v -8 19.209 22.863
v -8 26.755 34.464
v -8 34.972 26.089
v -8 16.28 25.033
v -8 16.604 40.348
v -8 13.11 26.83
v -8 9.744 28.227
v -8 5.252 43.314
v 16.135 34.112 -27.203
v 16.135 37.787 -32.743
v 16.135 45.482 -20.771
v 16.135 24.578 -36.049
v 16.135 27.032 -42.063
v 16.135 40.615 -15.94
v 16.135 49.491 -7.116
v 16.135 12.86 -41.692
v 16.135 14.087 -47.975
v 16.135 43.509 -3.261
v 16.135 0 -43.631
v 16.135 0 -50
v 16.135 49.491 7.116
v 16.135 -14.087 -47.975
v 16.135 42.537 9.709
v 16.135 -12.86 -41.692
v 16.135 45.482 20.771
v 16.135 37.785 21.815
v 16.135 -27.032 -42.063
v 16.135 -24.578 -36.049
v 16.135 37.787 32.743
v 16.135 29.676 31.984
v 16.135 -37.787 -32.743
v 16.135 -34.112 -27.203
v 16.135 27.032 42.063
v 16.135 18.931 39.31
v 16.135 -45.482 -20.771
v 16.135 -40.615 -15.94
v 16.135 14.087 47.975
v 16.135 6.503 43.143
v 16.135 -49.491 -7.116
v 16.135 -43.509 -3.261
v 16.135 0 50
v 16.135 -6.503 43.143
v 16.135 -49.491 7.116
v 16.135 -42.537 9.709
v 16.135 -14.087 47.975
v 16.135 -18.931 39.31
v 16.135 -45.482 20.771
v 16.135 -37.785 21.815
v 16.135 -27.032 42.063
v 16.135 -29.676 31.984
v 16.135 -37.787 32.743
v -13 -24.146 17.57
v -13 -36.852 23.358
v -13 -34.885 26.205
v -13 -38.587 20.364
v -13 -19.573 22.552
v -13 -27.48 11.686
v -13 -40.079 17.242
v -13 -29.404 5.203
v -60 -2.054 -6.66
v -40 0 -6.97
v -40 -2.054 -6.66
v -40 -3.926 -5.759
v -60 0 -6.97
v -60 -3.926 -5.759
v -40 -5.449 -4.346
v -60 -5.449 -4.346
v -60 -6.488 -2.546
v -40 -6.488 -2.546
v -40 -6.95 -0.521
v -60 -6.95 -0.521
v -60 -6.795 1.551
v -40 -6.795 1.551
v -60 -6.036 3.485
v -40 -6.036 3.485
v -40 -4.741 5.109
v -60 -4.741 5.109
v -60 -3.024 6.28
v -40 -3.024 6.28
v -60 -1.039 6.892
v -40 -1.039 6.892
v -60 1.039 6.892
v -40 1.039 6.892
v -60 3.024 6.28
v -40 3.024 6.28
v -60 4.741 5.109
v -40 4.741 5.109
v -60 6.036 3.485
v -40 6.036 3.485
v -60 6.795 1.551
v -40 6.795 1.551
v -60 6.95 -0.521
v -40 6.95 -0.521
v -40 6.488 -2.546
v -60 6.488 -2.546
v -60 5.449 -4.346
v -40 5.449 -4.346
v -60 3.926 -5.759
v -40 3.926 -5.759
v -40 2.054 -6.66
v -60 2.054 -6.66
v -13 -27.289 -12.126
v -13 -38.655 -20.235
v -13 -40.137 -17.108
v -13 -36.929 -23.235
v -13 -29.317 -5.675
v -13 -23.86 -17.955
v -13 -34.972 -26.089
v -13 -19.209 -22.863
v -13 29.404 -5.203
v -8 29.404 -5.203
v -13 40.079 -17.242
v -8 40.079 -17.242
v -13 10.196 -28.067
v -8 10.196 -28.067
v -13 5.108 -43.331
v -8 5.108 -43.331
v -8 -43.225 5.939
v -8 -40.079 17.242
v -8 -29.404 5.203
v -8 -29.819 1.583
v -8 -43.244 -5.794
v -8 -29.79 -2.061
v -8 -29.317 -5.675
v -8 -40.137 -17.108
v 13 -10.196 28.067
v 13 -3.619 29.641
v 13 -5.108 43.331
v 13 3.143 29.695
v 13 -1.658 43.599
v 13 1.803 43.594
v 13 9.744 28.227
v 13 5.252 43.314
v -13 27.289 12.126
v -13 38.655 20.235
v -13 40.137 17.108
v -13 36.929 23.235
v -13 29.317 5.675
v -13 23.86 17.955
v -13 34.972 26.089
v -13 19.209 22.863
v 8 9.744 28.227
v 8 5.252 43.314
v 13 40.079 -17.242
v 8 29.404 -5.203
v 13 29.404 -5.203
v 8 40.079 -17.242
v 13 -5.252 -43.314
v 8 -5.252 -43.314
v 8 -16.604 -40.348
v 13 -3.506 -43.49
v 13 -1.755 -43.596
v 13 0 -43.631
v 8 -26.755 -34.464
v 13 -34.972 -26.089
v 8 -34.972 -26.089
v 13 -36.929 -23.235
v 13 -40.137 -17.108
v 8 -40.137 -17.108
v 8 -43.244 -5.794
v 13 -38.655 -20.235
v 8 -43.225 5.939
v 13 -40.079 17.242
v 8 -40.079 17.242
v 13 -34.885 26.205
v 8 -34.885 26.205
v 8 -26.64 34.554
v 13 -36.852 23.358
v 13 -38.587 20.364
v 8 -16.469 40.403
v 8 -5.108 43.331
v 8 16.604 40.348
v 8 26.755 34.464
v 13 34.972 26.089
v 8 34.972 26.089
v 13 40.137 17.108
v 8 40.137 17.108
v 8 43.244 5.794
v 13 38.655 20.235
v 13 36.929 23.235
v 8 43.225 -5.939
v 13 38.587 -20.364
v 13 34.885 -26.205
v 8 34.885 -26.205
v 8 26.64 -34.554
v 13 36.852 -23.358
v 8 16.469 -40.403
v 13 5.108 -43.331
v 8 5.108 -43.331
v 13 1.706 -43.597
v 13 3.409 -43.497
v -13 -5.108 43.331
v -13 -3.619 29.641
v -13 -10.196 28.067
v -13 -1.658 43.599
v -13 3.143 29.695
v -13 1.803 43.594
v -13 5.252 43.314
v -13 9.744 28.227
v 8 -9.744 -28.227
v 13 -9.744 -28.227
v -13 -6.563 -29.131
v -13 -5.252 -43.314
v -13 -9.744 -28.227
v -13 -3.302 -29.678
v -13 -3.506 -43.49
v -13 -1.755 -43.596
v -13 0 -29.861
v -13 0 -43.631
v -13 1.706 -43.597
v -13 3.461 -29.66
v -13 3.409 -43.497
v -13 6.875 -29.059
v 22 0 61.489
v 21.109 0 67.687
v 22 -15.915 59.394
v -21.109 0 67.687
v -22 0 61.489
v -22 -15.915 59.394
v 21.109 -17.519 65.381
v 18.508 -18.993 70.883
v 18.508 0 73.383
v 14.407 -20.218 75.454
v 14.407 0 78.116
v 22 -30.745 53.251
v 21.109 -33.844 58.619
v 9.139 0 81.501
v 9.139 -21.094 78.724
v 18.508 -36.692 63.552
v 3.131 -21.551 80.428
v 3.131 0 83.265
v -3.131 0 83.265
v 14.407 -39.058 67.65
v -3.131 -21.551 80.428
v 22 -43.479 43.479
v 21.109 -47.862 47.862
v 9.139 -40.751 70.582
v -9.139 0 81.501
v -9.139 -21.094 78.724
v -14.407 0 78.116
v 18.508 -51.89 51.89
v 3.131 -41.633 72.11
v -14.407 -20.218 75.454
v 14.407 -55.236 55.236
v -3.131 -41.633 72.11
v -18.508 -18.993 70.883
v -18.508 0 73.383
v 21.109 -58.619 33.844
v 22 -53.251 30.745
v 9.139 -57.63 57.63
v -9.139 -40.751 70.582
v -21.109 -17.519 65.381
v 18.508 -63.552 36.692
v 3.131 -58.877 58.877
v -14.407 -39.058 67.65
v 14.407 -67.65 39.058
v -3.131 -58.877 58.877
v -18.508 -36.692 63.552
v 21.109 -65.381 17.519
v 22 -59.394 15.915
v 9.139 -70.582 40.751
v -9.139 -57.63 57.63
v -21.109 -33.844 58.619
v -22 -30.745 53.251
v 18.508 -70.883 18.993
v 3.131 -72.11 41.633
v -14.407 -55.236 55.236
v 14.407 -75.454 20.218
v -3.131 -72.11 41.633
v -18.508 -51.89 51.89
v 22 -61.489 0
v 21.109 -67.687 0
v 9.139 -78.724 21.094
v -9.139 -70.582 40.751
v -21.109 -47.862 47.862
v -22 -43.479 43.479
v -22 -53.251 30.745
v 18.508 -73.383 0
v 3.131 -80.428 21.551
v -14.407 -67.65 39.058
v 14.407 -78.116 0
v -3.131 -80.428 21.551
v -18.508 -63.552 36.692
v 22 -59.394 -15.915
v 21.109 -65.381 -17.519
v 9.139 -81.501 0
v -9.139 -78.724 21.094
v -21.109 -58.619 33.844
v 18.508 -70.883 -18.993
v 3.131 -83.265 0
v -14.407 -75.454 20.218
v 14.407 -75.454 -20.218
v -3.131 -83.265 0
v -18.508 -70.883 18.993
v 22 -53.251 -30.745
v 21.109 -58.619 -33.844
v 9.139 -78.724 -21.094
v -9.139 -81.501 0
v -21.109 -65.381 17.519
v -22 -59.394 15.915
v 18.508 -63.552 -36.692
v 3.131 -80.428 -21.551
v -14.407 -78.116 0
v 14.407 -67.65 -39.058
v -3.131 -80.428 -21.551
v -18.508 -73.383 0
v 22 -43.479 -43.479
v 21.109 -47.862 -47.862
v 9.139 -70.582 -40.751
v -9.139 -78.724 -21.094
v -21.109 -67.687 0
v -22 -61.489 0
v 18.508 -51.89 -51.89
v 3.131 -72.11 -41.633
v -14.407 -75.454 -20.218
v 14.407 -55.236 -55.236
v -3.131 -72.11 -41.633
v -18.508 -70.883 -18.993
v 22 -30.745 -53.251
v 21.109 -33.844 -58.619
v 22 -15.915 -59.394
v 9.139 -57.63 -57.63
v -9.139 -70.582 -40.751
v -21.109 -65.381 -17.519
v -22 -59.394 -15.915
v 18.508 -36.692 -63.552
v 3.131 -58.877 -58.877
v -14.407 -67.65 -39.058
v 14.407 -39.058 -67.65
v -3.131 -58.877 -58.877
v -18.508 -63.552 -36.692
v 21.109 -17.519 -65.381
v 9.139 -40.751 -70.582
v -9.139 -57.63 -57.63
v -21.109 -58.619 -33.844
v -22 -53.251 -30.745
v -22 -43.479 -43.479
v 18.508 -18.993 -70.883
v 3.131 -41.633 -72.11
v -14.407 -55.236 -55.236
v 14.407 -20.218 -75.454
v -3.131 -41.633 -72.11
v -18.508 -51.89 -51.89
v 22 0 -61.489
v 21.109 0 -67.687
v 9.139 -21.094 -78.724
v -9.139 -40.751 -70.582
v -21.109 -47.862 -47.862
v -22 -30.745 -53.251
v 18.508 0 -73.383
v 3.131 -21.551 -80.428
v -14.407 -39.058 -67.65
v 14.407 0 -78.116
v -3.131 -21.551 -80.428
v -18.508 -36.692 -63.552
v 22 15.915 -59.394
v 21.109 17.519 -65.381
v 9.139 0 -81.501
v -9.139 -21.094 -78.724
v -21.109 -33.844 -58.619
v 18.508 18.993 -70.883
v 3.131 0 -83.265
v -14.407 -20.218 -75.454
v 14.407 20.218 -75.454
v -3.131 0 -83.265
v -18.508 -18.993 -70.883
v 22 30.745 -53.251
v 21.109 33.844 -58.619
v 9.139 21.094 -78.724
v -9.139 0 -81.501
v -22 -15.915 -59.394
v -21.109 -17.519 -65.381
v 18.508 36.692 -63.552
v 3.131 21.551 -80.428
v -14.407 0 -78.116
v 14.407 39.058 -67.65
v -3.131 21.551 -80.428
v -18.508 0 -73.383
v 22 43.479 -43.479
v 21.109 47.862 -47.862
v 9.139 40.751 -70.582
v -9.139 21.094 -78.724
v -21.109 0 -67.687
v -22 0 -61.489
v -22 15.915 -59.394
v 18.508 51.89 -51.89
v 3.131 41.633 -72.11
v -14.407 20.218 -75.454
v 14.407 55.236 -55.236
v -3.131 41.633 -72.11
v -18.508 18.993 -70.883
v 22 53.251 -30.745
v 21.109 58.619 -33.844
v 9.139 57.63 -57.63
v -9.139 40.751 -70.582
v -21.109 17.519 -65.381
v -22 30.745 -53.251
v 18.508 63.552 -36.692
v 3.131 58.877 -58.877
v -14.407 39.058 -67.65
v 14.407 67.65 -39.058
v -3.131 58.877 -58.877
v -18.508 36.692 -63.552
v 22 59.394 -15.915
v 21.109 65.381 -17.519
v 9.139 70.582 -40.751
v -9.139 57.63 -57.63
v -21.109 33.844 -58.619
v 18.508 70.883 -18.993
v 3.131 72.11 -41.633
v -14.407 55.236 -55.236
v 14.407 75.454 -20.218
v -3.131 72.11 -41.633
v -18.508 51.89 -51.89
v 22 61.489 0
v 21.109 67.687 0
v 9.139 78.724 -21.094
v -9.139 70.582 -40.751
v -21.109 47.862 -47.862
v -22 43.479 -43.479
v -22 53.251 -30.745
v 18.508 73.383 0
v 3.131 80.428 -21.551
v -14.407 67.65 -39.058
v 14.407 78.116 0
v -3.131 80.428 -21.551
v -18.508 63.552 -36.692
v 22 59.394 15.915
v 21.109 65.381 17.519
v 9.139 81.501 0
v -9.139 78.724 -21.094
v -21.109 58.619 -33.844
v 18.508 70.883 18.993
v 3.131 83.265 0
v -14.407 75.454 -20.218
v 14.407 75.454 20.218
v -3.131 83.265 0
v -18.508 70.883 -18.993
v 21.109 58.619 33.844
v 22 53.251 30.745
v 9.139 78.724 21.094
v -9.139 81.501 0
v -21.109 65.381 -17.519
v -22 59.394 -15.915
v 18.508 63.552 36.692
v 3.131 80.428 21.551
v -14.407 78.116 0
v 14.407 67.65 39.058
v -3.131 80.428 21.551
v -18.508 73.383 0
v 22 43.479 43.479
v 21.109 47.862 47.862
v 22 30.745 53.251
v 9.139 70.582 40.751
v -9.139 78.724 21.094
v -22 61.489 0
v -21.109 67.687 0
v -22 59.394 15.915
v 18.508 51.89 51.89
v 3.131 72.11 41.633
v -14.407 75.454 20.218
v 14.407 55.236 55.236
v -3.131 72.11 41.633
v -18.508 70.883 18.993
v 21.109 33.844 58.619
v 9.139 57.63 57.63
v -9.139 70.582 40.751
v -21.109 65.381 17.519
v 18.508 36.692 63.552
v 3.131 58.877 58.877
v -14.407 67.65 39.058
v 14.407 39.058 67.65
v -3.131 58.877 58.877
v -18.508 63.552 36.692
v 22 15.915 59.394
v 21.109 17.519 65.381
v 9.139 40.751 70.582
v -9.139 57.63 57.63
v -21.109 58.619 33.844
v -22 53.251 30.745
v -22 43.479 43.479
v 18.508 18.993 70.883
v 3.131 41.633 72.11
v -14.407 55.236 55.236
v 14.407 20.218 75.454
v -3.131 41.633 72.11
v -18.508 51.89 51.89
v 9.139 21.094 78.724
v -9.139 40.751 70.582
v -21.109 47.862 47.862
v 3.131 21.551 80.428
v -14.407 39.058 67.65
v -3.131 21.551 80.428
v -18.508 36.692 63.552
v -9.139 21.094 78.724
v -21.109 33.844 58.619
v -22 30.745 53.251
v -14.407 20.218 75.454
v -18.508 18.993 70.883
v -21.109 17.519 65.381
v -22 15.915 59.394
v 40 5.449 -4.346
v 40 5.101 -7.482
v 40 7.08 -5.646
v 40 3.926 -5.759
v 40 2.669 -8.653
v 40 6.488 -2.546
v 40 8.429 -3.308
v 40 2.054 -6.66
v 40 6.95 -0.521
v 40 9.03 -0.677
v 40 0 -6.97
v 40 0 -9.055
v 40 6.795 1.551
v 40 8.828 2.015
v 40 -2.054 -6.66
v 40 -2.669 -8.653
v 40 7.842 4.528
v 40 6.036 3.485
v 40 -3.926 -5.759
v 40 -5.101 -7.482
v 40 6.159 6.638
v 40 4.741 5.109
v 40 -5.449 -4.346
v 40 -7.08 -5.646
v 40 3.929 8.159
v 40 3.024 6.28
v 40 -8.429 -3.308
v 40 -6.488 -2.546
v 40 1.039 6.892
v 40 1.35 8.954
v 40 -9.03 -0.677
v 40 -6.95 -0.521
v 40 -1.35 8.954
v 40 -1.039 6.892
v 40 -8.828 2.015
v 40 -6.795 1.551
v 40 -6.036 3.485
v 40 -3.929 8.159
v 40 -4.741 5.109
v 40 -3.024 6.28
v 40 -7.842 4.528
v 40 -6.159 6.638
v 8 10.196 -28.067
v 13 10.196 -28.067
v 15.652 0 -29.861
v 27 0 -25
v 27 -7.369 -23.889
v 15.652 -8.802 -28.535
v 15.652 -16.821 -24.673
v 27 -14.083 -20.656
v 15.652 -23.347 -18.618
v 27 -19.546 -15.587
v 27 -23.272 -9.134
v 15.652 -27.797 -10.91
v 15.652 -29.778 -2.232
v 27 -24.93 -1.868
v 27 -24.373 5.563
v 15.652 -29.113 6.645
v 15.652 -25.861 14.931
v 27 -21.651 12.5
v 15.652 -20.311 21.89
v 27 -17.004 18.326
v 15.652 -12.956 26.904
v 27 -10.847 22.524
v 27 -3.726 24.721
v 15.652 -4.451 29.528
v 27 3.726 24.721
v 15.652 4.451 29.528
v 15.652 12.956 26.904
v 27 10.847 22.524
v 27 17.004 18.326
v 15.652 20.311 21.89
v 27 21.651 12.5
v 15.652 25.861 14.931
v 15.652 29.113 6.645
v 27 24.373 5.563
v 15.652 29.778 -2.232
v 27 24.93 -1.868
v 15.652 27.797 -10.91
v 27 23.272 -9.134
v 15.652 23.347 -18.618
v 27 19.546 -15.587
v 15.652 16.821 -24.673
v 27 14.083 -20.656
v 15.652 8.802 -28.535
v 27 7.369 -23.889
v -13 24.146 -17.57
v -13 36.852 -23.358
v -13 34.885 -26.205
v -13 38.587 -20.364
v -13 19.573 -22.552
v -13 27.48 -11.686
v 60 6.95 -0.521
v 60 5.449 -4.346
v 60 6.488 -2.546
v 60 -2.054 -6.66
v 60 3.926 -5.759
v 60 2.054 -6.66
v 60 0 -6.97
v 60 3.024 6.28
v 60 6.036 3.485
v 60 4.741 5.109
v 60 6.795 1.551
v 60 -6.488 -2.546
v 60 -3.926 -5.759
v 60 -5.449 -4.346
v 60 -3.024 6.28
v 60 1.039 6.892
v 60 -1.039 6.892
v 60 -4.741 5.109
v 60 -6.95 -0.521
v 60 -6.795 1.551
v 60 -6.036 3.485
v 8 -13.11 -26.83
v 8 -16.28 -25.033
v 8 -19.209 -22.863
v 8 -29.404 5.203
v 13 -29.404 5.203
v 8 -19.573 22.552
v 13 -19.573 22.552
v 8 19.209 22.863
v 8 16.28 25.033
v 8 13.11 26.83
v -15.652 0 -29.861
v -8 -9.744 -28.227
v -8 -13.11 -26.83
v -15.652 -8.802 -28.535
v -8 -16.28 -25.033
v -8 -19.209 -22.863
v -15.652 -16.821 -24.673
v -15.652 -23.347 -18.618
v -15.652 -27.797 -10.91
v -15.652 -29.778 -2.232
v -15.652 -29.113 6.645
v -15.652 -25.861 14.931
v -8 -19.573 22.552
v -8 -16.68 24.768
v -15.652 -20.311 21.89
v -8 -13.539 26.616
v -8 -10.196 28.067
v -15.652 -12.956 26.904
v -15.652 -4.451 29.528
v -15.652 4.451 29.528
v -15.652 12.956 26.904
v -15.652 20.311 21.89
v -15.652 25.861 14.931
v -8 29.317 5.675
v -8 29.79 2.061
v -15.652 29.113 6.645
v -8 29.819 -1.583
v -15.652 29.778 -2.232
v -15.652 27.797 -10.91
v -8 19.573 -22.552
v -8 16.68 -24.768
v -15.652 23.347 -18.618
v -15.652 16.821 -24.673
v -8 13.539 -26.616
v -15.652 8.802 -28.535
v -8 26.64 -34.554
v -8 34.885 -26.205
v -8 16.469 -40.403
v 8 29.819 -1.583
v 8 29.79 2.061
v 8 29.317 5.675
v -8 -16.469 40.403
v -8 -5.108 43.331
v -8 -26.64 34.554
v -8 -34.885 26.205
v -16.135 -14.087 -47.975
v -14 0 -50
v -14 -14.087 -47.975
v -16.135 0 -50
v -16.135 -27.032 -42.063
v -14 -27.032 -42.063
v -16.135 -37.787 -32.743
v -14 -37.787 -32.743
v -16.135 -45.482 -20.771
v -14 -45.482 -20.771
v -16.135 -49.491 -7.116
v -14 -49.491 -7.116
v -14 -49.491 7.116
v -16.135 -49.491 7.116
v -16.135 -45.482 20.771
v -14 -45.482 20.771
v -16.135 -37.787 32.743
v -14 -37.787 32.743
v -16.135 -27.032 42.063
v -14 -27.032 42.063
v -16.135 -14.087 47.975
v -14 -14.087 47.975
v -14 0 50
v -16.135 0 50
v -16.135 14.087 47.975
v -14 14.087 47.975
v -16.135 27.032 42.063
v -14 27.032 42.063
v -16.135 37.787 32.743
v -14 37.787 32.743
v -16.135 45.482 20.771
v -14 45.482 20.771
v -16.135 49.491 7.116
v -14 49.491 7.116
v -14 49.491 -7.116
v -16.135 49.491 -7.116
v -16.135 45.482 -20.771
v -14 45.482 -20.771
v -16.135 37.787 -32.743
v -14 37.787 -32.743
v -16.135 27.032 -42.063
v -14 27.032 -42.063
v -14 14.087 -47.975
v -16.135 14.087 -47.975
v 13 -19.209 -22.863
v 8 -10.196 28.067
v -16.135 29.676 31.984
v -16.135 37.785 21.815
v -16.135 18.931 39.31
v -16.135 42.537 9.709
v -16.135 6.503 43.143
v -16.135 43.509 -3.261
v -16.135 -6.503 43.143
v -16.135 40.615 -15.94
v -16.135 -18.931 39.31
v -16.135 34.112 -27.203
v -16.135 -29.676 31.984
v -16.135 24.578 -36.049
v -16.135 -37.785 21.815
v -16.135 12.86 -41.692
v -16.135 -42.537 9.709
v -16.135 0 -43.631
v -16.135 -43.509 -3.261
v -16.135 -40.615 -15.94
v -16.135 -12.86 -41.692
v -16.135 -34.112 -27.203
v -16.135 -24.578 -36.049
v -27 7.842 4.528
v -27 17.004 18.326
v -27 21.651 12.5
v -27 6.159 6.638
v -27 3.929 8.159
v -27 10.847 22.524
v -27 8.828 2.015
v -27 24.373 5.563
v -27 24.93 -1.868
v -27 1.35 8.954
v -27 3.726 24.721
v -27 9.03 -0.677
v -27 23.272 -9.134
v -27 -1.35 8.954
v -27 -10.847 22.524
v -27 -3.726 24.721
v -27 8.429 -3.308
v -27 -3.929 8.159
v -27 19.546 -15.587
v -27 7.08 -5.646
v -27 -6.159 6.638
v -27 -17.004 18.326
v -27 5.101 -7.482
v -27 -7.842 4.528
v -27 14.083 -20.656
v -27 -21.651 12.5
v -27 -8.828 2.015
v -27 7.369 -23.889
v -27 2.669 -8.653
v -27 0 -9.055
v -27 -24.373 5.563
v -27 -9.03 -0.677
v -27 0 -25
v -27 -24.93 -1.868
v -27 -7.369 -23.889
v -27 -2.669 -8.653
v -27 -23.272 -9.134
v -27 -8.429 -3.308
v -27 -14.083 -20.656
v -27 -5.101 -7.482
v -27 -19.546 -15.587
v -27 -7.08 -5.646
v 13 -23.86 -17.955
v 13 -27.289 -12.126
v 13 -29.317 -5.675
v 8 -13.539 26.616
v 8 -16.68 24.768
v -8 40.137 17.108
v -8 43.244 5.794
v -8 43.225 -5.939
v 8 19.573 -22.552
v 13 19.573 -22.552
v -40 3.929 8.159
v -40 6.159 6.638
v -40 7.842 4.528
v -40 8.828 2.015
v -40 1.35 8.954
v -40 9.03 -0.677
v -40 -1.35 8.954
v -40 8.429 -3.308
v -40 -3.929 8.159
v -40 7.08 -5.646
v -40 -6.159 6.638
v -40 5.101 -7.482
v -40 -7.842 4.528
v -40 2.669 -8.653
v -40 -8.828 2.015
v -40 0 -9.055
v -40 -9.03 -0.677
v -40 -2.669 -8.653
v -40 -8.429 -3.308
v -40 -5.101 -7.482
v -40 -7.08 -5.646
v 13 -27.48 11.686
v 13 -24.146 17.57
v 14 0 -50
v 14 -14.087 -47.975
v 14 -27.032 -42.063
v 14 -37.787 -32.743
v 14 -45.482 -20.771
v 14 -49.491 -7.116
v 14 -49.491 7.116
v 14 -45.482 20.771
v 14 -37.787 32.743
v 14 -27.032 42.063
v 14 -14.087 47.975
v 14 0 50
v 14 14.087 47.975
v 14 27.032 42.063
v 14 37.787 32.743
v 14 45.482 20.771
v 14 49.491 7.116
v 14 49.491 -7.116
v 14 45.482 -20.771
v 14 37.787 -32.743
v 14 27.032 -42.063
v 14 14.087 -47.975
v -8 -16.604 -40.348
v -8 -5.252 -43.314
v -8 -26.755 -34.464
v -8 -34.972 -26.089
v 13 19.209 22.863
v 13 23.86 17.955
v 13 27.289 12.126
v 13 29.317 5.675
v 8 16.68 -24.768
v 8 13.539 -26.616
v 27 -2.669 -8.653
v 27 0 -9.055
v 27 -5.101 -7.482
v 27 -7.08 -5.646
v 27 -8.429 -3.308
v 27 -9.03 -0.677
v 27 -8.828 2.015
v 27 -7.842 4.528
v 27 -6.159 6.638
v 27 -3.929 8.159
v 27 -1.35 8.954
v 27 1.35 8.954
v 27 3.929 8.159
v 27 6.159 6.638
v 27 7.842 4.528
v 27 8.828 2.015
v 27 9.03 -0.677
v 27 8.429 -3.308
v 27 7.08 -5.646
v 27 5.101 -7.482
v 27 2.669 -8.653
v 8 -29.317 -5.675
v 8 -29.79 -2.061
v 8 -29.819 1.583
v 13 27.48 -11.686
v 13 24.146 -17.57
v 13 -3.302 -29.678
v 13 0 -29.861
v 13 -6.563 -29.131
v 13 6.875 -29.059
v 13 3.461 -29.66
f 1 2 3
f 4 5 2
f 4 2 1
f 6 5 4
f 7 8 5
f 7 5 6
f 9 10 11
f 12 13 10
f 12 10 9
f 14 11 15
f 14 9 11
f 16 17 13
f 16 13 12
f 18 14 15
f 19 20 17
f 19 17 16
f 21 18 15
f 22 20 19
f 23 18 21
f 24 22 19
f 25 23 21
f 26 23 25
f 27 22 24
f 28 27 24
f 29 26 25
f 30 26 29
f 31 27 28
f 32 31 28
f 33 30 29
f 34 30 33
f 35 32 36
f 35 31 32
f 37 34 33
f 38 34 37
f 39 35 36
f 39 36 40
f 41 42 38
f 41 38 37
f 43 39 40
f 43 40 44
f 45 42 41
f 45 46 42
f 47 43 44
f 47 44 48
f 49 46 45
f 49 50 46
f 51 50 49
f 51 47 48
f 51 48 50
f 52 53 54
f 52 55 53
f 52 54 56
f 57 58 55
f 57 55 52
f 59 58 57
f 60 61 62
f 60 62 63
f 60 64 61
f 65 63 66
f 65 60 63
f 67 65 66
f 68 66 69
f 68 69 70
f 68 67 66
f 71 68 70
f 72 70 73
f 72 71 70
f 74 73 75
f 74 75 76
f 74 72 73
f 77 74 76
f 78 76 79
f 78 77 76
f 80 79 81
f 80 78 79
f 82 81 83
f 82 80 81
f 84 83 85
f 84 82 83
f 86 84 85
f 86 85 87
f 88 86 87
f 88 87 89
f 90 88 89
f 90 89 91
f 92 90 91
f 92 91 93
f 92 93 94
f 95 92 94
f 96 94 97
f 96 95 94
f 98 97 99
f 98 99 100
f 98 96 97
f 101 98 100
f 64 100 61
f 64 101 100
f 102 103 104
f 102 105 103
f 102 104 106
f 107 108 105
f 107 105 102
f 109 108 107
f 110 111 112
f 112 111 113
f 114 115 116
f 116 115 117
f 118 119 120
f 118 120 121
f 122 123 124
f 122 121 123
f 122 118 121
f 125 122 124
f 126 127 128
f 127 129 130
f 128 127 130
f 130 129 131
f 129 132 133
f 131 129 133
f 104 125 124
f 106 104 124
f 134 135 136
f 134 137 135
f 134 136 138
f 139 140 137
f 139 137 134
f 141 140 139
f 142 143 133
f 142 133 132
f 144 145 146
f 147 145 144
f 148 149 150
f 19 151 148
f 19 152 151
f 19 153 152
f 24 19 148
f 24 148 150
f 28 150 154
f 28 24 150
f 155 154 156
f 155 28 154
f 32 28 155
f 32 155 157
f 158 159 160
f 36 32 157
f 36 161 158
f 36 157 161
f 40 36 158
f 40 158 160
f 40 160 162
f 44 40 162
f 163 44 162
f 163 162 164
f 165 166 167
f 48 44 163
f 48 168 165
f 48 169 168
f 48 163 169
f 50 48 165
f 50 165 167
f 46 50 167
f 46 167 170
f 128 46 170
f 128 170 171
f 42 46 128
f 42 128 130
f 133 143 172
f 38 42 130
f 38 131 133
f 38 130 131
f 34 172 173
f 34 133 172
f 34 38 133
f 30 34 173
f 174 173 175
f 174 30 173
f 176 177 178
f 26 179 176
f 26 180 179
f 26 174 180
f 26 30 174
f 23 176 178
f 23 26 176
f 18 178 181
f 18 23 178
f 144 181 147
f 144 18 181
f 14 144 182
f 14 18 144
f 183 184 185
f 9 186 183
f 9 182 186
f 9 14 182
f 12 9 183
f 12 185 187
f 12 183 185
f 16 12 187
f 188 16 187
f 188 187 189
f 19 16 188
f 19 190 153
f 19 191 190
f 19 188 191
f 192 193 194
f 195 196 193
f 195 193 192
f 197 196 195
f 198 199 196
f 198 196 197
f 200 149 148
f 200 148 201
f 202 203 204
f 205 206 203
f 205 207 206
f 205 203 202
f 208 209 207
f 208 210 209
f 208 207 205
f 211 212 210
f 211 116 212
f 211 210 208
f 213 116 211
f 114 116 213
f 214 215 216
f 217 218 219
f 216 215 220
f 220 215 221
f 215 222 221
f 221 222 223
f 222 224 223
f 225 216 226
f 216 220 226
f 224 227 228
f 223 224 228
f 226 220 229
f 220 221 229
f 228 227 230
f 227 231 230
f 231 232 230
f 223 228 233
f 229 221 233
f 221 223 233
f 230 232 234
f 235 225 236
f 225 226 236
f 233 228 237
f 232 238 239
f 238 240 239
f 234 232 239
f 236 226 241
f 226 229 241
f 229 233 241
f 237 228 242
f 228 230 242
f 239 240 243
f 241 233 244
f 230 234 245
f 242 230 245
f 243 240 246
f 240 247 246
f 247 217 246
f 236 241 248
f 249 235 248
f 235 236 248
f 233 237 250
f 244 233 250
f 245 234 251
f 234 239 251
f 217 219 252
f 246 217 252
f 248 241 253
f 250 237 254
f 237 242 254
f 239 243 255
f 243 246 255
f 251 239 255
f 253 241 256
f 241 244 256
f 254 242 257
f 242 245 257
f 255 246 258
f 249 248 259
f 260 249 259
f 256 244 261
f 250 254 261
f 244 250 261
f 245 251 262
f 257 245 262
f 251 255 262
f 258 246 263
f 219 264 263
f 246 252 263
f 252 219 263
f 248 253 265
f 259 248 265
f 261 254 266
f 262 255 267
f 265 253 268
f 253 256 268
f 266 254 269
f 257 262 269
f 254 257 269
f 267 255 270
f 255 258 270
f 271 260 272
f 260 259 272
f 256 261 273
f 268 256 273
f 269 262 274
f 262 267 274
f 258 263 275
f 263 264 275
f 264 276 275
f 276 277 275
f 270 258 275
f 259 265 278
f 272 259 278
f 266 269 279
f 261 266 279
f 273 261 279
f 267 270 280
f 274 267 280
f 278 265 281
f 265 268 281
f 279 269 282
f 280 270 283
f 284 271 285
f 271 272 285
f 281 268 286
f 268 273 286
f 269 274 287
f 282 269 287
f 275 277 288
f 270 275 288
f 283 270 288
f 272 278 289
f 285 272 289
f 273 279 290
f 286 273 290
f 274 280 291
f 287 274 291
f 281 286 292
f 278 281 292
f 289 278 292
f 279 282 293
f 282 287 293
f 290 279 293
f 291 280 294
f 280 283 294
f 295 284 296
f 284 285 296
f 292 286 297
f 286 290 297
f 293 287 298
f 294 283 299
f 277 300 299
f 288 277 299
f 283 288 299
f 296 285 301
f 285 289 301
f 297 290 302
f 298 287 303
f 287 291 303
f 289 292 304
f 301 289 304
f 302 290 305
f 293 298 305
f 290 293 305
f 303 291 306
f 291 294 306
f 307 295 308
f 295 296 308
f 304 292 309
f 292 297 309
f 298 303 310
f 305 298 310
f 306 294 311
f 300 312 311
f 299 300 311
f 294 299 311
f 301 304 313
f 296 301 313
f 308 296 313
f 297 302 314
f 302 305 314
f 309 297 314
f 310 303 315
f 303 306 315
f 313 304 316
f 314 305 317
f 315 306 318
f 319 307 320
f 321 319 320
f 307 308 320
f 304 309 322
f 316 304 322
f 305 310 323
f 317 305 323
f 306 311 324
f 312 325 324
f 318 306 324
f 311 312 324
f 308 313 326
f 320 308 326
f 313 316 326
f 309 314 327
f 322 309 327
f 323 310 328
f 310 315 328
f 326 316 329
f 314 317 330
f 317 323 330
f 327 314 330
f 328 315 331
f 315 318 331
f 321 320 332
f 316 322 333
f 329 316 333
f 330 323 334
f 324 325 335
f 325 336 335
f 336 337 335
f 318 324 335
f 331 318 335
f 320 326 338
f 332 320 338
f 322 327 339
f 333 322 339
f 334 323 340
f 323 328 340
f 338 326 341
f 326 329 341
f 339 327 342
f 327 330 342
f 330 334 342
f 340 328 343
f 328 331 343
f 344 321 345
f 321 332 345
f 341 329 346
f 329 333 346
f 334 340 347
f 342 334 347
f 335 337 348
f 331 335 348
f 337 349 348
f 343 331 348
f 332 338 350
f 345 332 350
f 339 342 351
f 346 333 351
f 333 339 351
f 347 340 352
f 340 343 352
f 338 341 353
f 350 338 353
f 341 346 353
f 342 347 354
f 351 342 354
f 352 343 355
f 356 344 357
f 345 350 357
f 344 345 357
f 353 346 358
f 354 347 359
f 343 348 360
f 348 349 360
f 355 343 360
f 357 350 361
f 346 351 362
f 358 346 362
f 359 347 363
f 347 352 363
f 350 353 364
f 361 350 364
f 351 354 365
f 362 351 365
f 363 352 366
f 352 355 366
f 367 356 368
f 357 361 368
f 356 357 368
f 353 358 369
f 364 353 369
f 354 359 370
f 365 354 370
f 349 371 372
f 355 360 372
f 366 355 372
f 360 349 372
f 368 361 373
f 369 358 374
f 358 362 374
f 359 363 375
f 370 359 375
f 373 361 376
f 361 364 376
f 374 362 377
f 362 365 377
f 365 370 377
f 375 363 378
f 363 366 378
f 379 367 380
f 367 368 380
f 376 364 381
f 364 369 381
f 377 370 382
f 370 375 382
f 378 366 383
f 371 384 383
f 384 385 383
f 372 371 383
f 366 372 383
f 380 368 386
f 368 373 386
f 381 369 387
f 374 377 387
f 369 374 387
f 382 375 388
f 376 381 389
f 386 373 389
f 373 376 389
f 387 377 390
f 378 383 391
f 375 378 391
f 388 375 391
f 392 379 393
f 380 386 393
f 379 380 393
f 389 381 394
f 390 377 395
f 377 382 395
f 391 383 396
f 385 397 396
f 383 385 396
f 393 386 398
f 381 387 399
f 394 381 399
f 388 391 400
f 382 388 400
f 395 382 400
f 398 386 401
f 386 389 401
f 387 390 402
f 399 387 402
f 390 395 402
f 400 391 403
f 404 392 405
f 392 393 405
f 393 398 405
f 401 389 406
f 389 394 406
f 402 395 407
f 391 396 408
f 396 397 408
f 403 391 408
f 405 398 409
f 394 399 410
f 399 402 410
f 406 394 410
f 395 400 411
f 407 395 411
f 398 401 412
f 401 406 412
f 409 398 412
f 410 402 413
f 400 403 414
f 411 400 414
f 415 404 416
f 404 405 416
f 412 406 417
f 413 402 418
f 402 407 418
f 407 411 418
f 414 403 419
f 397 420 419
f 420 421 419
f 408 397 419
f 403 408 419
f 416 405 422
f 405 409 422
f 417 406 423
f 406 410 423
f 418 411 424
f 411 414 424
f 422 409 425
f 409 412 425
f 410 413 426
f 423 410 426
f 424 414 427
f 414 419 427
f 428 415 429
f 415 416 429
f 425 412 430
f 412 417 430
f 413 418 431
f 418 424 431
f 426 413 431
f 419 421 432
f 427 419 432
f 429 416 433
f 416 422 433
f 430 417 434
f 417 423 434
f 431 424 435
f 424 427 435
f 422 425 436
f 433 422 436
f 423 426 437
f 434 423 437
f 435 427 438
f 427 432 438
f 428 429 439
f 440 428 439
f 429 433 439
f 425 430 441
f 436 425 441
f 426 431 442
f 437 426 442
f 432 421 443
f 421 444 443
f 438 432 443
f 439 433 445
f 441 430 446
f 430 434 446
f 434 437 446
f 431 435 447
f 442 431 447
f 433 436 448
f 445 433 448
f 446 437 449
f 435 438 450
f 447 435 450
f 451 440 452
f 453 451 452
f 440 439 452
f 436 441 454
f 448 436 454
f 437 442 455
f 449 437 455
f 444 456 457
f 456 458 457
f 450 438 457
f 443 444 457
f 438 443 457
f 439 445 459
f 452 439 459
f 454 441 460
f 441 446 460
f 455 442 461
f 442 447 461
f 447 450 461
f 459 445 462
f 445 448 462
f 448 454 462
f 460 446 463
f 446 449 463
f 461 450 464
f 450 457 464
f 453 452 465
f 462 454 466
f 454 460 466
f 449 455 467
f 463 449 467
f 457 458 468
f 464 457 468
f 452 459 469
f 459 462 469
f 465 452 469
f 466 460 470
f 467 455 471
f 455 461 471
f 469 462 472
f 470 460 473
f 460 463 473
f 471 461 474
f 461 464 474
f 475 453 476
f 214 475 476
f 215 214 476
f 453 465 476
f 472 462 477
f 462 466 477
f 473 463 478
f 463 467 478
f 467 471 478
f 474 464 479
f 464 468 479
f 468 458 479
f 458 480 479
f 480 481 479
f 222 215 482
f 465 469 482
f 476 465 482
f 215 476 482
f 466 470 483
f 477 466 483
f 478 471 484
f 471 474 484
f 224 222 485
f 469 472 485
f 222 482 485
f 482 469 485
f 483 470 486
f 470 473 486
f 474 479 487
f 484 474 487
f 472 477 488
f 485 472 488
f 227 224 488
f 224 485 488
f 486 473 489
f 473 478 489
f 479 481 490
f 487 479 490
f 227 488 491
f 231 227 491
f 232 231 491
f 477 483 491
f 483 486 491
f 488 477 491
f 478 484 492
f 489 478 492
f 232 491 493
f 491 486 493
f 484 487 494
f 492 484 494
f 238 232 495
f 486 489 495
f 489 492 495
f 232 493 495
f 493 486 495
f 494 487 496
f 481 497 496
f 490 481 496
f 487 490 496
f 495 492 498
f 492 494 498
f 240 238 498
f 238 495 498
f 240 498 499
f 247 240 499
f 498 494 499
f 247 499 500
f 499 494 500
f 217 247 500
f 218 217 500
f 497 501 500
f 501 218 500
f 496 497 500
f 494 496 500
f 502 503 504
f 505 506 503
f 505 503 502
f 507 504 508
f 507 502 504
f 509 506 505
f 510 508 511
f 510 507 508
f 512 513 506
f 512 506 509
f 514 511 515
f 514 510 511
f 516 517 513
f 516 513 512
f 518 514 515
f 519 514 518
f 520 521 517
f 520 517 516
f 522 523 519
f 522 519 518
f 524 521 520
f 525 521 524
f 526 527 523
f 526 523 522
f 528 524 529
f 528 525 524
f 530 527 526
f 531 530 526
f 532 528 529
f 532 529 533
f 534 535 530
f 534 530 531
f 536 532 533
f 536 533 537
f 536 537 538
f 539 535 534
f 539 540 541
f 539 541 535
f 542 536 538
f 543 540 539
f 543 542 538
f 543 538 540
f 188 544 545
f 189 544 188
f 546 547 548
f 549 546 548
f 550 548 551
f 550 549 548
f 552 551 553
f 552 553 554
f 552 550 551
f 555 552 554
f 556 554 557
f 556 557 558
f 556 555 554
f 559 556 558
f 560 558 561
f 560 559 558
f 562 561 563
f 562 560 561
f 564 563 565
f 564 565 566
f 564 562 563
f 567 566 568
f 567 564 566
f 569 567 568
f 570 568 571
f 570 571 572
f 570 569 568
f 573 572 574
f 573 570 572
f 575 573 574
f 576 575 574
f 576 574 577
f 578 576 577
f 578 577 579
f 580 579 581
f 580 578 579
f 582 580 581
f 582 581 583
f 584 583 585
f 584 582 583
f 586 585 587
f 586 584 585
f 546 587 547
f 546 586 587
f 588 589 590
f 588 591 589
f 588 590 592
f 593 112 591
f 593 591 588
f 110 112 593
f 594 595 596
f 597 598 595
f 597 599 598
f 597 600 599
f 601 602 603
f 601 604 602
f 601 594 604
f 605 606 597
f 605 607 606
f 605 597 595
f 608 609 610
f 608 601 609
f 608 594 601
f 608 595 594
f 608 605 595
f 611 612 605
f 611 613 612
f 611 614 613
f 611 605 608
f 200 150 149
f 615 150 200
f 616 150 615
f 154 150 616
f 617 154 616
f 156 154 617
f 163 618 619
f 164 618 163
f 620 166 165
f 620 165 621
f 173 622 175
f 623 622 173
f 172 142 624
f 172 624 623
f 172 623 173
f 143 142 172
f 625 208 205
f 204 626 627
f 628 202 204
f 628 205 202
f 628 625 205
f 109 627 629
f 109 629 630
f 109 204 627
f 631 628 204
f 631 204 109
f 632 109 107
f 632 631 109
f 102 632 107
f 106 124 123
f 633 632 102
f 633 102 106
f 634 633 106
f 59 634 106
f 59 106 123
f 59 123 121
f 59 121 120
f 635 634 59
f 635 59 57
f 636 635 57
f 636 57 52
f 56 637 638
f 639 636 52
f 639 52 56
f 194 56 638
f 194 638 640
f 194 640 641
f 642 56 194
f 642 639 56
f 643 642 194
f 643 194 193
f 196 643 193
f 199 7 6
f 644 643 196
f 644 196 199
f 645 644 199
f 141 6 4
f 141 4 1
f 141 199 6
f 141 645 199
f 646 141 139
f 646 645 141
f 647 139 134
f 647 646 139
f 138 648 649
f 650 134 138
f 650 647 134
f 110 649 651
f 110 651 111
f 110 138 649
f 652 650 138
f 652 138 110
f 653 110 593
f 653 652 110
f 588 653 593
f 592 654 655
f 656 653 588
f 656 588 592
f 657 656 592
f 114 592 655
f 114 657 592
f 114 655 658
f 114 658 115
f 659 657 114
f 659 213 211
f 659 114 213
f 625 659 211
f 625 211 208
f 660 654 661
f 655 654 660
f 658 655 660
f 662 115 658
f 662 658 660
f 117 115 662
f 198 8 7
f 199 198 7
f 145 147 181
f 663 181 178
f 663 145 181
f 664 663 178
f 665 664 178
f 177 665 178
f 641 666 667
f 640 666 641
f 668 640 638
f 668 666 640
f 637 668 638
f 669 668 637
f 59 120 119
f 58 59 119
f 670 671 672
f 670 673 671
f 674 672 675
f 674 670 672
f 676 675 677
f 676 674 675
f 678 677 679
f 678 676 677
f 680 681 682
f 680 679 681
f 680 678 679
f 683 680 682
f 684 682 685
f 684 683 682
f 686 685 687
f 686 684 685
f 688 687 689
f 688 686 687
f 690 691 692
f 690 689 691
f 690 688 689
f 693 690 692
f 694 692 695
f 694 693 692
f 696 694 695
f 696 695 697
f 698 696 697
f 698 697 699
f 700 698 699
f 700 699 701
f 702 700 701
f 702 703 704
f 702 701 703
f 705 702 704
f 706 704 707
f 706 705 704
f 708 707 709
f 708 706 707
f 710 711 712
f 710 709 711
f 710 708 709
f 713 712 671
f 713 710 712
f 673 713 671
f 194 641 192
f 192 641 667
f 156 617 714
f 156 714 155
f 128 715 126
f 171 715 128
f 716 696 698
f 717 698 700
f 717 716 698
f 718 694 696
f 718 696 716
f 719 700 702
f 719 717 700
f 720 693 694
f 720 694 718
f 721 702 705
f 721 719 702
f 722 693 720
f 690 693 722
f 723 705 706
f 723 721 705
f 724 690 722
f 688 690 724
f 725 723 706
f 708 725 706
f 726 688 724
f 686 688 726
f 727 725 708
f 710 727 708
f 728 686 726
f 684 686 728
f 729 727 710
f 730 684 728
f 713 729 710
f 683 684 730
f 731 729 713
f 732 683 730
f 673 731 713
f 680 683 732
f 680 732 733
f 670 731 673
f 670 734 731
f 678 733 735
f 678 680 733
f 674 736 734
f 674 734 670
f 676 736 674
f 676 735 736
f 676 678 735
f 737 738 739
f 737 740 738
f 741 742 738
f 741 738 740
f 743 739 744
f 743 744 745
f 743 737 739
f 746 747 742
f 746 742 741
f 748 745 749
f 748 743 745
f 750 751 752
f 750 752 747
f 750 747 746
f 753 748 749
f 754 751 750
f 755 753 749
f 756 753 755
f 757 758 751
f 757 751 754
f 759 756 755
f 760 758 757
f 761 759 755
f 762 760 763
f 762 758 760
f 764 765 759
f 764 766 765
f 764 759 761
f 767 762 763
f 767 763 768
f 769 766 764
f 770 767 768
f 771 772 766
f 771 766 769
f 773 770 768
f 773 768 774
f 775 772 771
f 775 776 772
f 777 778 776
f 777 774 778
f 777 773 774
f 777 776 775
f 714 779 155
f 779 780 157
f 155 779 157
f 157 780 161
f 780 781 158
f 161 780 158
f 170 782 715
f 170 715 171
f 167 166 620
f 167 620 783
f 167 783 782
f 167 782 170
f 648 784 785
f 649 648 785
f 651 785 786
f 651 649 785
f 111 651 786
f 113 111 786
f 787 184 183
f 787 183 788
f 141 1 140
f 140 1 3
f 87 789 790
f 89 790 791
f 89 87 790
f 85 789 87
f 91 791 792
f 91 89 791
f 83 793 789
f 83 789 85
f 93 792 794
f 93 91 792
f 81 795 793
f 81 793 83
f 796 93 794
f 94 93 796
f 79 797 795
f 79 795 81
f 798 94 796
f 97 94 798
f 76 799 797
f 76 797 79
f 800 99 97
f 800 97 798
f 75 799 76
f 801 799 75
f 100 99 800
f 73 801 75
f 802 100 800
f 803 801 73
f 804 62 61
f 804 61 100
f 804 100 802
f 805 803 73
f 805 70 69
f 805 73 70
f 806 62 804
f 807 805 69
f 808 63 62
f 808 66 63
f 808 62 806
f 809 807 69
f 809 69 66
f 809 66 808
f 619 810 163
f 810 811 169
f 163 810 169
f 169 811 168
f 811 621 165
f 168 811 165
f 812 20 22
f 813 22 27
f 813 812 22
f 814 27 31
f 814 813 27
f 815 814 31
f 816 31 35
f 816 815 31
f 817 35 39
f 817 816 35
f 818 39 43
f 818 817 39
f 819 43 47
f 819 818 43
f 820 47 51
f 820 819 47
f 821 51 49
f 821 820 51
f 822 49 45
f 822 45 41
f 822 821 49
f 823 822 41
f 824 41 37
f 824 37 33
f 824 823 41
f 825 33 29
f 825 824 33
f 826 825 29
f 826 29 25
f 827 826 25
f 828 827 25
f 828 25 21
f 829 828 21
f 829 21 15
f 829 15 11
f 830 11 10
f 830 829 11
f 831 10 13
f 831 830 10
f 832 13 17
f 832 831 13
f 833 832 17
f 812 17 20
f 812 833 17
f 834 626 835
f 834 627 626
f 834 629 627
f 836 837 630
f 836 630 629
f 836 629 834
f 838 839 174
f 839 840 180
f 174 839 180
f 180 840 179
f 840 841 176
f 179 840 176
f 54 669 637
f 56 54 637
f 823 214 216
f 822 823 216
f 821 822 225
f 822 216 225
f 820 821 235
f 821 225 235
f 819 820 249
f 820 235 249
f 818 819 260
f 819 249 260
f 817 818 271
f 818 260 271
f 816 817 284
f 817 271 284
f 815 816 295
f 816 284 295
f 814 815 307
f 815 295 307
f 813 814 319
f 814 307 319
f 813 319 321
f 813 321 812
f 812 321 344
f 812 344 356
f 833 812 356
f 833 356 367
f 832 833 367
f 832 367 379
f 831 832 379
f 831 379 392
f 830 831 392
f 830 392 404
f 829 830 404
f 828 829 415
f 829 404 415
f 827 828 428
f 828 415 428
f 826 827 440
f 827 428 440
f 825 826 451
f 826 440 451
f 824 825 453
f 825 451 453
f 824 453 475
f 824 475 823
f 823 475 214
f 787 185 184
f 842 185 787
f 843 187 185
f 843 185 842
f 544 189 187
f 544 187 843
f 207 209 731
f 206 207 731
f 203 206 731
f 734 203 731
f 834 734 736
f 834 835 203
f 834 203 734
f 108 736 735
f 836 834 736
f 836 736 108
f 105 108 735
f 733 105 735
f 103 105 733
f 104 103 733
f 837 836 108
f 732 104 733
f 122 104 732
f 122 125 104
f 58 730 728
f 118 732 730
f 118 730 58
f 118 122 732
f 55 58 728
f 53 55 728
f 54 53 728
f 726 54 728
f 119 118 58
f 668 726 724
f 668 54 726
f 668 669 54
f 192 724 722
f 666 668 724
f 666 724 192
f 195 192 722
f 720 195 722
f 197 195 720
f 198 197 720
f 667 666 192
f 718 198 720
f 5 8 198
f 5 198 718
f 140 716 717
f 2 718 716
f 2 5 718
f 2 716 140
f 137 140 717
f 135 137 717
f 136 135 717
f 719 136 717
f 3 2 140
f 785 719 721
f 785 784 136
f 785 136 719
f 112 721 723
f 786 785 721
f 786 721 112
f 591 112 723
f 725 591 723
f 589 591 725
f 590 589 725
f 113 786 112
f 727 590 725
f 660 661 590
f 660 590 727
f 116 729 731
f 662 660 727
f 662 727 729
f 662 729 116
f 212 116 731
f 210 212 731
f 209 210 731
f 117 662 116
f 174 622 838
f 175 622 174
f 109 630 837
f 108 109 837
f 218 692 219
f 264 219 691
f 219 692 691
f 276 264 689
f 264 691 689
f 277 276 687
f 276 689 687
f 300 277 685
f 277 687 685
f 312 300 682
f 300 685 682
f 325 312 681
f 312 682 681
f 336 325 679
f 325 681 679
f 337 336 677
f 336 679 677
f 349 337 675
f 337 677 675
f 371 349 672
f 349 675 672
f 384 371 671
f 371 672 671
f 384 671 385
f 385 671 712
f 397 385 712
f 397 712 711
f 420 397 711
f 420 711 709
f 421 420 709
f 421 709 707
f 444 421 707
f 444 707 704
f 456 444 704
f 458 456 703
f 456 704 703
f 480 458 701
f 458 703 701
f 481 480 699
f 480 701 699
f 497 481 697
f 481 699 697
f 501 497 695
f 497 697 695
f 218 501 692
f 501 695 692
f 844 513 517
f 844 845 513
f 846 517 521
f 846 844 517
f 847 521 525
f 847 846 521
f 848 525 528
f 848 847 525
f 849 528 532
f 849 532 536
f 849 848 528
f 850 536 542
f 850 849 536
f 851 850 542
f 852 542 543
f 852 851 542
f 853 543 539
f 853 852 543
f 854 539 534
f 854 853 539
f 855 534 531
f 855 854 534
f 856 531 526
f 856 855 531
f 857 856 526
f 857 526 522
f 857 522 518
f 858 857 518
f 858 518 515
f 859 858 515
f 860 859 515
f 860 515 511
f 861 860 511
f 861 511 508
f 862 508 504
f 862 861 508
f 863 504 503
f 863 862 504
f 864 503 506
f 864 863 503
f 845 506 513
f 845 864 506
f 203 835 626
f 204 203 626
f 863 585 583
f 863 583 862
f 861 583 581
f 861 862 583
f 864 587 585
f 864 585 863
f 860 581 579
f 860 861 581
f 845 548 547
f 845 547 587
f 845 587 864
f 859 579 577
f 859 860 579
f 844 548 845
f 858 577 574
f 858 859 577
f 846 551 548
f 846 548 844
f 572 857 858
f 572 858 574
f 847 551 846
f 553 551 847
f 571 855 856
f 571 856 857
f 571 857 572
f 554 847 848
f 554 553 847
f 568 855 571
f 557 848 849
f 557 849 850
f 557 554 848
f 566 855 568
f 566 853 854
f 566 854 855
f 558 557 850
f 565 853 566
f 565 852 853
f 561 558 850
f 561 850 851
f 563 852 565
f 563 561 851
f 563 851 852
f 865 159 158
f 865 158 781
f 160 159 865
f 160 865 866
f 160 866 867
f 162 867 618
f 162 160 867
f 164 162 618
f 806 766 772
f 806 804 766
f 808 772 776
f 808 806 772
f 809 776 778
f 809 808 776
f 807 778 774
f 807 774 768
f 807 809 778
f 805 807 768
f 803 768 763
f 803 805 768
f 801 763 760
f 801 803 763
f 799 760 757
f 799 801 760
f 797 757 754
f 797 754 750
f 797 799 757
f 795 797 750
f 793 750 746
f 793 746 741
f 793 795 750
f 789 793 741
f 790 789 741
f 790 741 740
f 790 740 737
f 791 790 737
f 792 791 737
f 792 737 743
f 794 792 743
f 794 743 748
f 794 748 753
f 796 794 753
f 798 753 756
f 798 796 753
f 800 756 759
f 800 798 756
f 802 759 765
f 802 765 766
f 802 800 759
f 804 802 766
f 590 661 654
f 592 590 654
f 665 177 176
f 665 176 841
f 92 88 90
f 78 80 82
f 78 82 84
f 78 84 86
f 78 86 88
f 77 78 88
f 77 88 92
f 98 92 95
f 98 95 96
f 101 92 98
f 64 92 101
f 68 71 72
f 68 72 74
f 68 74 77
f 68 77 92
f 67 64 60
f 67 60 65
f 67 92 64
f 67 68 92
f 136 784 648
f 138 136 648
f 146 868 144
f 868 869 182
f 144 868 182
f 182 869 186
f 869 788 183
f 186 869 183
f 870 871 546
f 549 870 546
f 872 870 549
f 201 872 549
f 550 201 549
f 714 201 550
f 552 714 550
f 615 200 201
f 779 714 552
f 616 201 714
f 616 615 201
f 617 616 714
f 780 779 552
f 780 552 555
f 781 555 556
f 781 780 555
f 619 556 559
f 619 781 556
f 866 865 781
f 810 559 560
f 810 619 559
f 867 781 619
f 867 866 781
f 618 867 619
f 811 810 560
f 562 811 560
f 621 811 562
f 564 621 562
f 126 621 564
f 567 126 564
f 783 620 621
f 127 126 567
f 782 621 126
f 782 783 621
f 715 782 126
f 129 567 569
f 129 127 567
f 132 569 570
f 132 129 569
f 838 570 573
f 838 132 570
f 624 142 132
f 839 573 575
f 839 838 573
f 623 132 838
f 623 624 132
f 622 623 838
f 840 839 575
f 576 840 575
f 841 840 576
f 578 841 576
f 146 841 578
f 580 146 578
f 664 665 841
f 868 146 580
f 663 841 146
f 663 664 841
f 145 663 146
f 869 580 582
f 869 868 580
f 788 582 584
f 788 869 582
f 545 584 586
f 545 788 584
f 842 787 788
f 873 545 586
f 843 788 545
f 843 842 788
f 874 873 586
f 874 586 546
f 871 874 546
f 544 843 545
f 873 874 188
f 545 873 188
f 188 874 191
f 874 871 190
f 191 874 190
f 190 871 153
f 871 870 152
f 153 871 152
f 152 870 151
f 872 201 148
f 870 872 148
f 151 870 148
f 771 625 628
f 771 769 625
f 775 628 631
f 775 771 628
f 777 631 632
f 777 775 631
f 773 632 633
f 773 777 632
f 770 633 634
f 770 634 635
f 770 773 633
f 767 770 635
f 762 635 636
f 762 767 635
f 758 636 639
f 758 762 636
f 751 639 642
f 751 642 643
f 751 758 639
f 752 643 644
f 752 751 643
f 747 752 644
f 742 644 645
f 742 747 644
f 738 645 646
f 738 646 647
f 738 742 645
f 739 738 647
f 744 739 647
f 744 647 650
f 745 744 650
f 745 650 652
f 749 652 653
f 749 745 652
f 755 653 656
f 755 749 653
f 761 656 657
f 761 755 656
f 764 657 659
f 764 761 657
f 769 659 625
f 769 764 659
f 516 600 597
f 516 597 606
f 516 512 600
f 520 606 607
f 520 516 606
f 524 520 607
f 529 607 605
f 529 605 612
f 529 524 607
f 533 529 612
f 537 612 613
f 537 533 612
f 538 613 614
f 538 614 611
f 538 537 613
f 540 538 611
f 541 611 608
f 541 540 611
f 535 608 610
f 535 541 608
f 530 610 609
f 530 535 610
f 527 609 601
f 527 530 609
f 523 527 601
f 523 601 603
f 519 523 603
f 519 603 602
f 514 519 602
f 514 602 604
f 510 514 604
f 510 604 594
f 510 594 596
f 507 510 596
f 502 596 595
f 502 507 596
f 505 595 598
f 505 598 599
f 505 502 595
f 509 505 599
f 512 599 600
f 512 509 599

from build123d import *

# Parameters (mm, degrees)
BOSS_EXTRUDE2_DEPTH  = 5
CIRPATTERN1_COUNT    = 6
MIRROR1_COPY_1_DEPTH = 5
MIRROR1_COPY_2_DEPTH = 5
MIRROR1_COPY_3_DEPTH = 5
MIRROR1_COPY_4_DEPTH = 5
MIRROR1_COPY_5_DEPTH = 5


with BuildPart() as part:
    # Sketch2 → Revolve1 (revolve)
    with BuildSketch(Plane.XY, mode=Mode.PRIVATE) as revolve1_sk:
        with BuildLine():
            Line((-22, 61.489125293), (-14, 50))
            Line((-14, 50), (-8, 50))
            ThreePointArc((-8, 50), (-5.656854249, 44.343145751), (0, 42))
            ThreePointArc((0, 42), (5.656854249, 44.343145751), (8, 50))
            Line((8, 50), (14, 50))
            Line((14, 50), (22, 61.489125293))
            ThreePointArc((22, 61.489125293), (0, 83.489125293), (-22, 61.489125293))
        make_face()
    revolve(revolve1_sk.sketch.rotate(Axis((0, 0, 0), (1, 0, 0)), 90), axis=Axis((0, 0, 0), (1, 0, 0)))

    # Sketch3 → Revolve2 (revolve)
    with BuildSketch(Plane.XY, mode=Mode.PRIVATE) as revolve2_sk:
        with BuildLine():
            Line((-27, 9.055449855), (-40, 9.055449855))
            Line((-40, 9.055449855), (-40, 6.969952313))
            Line((-40, 6.969952313), (-60, 6.969952313))
            Line((-60, 6.969952313), (-60, 0))
            Line((-60, 0), (60, 0))
            Line((60, 0), (60, 6.969952313))
            Line((60, 6.969952313), (40, 6.969952313))
            Line((40, 6.969952313), (40, 9.055449855))
            Line((40, 9.055449855), (27, 9.055449855))
            Line((27, 9.055449855), (27, 25))
            Line((27, 25), (15.652221366, 29.861325966))
            Line((15.652221366, 29.861325966), (8, 29.861325966))
            Line((8, 29.861325966), (8, 43.630803847))
            Line((8, 43.630803847), (16.135165196, 43.630803847))
            Line((16.135165196, 43.630803847), (16.135165196, 50))
            Line((16.135165196, 50), (8, 50))
            ThreePointArc((8, 50), (0, 42), (-8, 50))
            Line((-8, 50), (-16.135165196, 50))
            Line((-16.135165196, 50), (-16.135165196, 43.630803847))
            Line((-16.135165196, 43.630803847), (-8, 43.630803847))
            Line((-8, 43.630803847), (-8, 29.861325966))
            Line((-8, 29.861325966), (-15.652221366, 29.861325966))
            Line((-15.652221366, 29.861325966), (-27, 25))
            Line((-27, 25), (-27, 9.055449855))
        make_face()
    revolve(revolve2_sk.sketch.rotate(Axis((-27, 0, 0), (-1, 0, 0)), 90), axis=Axis((-27, 0, 0), (-1, 0, 0)))

    # Sketch4 → Boss-Extrude2 (add)
    with BuildSketch(Plane(origin=(8, 0, 0), x_dir=(0, 0, -1), z_dir=(1, 0, 0))):
        with BuildLine():
            Line((-49.891400962, 3.293646928), (-28.226766869, 9.744148017))
            ThreePointArc((-28.226766869, 9.744148017), (-29.860364168, -0.239666883), (-28.066722375, -10.19597389))
            Line((-28.066722375, -10.19597389), (-49.91509062, -2.912684053))
            ThreePointArc((-49.91509062, -2.912684053), (-49.999635764, 0.190849359), (-49.891400962, 3.293646928))
        make_face()
    boss_extrude2 = extrude(amount=BOSS_EXTRUDE2_DEPTH)

    # CirPattern1: Boss-Extrude2 ×6 about axis
    cirpattern1_axis = Axis((0, 0, 0), (1, 0, 0))
    for i in range(1, CIRPATTERN1_COUNT):
        add(boss_extrude2.rotate(cirpattern1_axis, i * 360 / CIRPATTERN1_COUNT))

    # Mirror1: Boss-Extrude2 across plane
    add(boss_extrude2.mirror(Plane(origin=(0, 0, 0), x_dir=(0, 0, 1), z_dir=(1, 0, 0))))

    # Mirror1 copy 1 sketch → Mirror1 copy 1 (add)
    with BuildSketch(Plane(origin=(-8, 0, 0), x_dir=(0, 0.8660254037844386, -0.5000000000000001), z_dir=(-1, 0, 0))):
        with BuildLine():
            Line((-49.891400962, -3.293646928), (-28.226766869, -9.744148017))
            ThreePointArc((-28.226766869, -9.744148017), (-29.860364168, 0.239666883), (-28.066722375, 10.19597389))
            Line((-28.066722375, 10.19597389), (-49.91509062, 2.912684053))
            ThreePointArc((-49.91509062, 2.912684053), (-49.999635764, -0.190849359), (-49.891400962, -3.293646928))
        make_face()
    extrude(amount=MIRROR1_COPY_1_DEPTH)

    # Mirror1 copy 2 sketch → Mirror1 copy 2 (add)
    with BuildSketch(Plane(origin=(-8, 0, 0), x_dir=(0, 0.8660254037844387, 0.4999999999999998), z_dir=(-1, 0, 0))):
        with BuildLine():
            Line((-49.891400962, -3.293646928), (-28.226766869, -9.744148017))
            ThreePointArc((-28.226766869, -9.744148017), (-29.860364168, 0.239666883), (-28.066722375, 10.19597389))
            Line((-28.066722375, 10.19597389), (-49.91509062, 2.912684053))
            ThreePointArc((-49.91509062, 2.912684053), (-49.999635764, -0.190849359), (-49.891400962, -3.293646928))
        make_face()
    extrude(amount=MIRROR1_COPY_2_DEPTH)

    # Mirror1 copy 3 sketch → Mirror1 copy 3 (add)
    with BuildSketch(Plane.ZY.offset(8)):
        with BuildLine():
            Line((-49.891400962, -3.293646928), (-28.226766869, -9.744148017))
            ThreePointArc((-28.226766869, -9.744148017), (-29.860364168, 0.239666883), (-28.066722375, 10.19597389))
            Line((-28.066722375, 10.19597389), (-49.91509062, 2.912684053))
            ThreePointArc((-49.91509062, 2.912684053), (-49.999635764, -0.190849359), (-49.891400962, -3.293646928))
        make_face()
    extrude(amount=MIRROR1_COPY_3_DEPTH)

    # Mirror1 copy 4 sketch → Mirror1 copy 4 (add)
    with BuildSketch(Plane(origin=(-8, 0, 0), x_dir=(0, -0.8660254037844384, 0.5000000000000004), z_dir=(-1, 0, 0))):
        with BuildLine():
            Line((-49.891400962, -3.293646928), (-28.226766869, -9.744148017))
            ThreePointArc((-28.226766869, -9.744148017), (-29.860364168, 0.239666883), (-28.066722375, 10.19597389))
            Line((-28.066722375, 10.19597389), (-49.91509062, 2.912684053))
            ThreePointArc((-49.91509062, 2.912684053), (-49.999635764, -0.190849359), (-49.891400962, -3.293646928))
        make_face()
    extrude(amount=MIRROR1_COPY_4_DEPTH)

    # Mirror1 copy 5 sketch → Mirror1 copy 5 (add)
    with BuildSketch(Plane(origin=(-8, 0, 0), x_dir=(0, -0.8660254037844386, -0.5000000000000001), z_dir=(-1, 0, 0))):
        with BuildLine():
            Line((-49.891400962, -3.293646928), (-28.226766869, -9.744148017))
            ThreePointArc((-28.226766869, -9.744148017), (-29.860364168, 0.239666883), (-28.066722375, 10.19597389))
            Line((-28.066722375, 10.19597389), (-49.91509062, 2.912684053))
            ThreePointArc((-49.91509062, 2.912684053), (-49.999635764, -0.190849359), (-49.891400962, -3.293646928))
        make_face()
    extrude(amount=MIRROR1_COPY_5_DEPTH)


solid = part.part
